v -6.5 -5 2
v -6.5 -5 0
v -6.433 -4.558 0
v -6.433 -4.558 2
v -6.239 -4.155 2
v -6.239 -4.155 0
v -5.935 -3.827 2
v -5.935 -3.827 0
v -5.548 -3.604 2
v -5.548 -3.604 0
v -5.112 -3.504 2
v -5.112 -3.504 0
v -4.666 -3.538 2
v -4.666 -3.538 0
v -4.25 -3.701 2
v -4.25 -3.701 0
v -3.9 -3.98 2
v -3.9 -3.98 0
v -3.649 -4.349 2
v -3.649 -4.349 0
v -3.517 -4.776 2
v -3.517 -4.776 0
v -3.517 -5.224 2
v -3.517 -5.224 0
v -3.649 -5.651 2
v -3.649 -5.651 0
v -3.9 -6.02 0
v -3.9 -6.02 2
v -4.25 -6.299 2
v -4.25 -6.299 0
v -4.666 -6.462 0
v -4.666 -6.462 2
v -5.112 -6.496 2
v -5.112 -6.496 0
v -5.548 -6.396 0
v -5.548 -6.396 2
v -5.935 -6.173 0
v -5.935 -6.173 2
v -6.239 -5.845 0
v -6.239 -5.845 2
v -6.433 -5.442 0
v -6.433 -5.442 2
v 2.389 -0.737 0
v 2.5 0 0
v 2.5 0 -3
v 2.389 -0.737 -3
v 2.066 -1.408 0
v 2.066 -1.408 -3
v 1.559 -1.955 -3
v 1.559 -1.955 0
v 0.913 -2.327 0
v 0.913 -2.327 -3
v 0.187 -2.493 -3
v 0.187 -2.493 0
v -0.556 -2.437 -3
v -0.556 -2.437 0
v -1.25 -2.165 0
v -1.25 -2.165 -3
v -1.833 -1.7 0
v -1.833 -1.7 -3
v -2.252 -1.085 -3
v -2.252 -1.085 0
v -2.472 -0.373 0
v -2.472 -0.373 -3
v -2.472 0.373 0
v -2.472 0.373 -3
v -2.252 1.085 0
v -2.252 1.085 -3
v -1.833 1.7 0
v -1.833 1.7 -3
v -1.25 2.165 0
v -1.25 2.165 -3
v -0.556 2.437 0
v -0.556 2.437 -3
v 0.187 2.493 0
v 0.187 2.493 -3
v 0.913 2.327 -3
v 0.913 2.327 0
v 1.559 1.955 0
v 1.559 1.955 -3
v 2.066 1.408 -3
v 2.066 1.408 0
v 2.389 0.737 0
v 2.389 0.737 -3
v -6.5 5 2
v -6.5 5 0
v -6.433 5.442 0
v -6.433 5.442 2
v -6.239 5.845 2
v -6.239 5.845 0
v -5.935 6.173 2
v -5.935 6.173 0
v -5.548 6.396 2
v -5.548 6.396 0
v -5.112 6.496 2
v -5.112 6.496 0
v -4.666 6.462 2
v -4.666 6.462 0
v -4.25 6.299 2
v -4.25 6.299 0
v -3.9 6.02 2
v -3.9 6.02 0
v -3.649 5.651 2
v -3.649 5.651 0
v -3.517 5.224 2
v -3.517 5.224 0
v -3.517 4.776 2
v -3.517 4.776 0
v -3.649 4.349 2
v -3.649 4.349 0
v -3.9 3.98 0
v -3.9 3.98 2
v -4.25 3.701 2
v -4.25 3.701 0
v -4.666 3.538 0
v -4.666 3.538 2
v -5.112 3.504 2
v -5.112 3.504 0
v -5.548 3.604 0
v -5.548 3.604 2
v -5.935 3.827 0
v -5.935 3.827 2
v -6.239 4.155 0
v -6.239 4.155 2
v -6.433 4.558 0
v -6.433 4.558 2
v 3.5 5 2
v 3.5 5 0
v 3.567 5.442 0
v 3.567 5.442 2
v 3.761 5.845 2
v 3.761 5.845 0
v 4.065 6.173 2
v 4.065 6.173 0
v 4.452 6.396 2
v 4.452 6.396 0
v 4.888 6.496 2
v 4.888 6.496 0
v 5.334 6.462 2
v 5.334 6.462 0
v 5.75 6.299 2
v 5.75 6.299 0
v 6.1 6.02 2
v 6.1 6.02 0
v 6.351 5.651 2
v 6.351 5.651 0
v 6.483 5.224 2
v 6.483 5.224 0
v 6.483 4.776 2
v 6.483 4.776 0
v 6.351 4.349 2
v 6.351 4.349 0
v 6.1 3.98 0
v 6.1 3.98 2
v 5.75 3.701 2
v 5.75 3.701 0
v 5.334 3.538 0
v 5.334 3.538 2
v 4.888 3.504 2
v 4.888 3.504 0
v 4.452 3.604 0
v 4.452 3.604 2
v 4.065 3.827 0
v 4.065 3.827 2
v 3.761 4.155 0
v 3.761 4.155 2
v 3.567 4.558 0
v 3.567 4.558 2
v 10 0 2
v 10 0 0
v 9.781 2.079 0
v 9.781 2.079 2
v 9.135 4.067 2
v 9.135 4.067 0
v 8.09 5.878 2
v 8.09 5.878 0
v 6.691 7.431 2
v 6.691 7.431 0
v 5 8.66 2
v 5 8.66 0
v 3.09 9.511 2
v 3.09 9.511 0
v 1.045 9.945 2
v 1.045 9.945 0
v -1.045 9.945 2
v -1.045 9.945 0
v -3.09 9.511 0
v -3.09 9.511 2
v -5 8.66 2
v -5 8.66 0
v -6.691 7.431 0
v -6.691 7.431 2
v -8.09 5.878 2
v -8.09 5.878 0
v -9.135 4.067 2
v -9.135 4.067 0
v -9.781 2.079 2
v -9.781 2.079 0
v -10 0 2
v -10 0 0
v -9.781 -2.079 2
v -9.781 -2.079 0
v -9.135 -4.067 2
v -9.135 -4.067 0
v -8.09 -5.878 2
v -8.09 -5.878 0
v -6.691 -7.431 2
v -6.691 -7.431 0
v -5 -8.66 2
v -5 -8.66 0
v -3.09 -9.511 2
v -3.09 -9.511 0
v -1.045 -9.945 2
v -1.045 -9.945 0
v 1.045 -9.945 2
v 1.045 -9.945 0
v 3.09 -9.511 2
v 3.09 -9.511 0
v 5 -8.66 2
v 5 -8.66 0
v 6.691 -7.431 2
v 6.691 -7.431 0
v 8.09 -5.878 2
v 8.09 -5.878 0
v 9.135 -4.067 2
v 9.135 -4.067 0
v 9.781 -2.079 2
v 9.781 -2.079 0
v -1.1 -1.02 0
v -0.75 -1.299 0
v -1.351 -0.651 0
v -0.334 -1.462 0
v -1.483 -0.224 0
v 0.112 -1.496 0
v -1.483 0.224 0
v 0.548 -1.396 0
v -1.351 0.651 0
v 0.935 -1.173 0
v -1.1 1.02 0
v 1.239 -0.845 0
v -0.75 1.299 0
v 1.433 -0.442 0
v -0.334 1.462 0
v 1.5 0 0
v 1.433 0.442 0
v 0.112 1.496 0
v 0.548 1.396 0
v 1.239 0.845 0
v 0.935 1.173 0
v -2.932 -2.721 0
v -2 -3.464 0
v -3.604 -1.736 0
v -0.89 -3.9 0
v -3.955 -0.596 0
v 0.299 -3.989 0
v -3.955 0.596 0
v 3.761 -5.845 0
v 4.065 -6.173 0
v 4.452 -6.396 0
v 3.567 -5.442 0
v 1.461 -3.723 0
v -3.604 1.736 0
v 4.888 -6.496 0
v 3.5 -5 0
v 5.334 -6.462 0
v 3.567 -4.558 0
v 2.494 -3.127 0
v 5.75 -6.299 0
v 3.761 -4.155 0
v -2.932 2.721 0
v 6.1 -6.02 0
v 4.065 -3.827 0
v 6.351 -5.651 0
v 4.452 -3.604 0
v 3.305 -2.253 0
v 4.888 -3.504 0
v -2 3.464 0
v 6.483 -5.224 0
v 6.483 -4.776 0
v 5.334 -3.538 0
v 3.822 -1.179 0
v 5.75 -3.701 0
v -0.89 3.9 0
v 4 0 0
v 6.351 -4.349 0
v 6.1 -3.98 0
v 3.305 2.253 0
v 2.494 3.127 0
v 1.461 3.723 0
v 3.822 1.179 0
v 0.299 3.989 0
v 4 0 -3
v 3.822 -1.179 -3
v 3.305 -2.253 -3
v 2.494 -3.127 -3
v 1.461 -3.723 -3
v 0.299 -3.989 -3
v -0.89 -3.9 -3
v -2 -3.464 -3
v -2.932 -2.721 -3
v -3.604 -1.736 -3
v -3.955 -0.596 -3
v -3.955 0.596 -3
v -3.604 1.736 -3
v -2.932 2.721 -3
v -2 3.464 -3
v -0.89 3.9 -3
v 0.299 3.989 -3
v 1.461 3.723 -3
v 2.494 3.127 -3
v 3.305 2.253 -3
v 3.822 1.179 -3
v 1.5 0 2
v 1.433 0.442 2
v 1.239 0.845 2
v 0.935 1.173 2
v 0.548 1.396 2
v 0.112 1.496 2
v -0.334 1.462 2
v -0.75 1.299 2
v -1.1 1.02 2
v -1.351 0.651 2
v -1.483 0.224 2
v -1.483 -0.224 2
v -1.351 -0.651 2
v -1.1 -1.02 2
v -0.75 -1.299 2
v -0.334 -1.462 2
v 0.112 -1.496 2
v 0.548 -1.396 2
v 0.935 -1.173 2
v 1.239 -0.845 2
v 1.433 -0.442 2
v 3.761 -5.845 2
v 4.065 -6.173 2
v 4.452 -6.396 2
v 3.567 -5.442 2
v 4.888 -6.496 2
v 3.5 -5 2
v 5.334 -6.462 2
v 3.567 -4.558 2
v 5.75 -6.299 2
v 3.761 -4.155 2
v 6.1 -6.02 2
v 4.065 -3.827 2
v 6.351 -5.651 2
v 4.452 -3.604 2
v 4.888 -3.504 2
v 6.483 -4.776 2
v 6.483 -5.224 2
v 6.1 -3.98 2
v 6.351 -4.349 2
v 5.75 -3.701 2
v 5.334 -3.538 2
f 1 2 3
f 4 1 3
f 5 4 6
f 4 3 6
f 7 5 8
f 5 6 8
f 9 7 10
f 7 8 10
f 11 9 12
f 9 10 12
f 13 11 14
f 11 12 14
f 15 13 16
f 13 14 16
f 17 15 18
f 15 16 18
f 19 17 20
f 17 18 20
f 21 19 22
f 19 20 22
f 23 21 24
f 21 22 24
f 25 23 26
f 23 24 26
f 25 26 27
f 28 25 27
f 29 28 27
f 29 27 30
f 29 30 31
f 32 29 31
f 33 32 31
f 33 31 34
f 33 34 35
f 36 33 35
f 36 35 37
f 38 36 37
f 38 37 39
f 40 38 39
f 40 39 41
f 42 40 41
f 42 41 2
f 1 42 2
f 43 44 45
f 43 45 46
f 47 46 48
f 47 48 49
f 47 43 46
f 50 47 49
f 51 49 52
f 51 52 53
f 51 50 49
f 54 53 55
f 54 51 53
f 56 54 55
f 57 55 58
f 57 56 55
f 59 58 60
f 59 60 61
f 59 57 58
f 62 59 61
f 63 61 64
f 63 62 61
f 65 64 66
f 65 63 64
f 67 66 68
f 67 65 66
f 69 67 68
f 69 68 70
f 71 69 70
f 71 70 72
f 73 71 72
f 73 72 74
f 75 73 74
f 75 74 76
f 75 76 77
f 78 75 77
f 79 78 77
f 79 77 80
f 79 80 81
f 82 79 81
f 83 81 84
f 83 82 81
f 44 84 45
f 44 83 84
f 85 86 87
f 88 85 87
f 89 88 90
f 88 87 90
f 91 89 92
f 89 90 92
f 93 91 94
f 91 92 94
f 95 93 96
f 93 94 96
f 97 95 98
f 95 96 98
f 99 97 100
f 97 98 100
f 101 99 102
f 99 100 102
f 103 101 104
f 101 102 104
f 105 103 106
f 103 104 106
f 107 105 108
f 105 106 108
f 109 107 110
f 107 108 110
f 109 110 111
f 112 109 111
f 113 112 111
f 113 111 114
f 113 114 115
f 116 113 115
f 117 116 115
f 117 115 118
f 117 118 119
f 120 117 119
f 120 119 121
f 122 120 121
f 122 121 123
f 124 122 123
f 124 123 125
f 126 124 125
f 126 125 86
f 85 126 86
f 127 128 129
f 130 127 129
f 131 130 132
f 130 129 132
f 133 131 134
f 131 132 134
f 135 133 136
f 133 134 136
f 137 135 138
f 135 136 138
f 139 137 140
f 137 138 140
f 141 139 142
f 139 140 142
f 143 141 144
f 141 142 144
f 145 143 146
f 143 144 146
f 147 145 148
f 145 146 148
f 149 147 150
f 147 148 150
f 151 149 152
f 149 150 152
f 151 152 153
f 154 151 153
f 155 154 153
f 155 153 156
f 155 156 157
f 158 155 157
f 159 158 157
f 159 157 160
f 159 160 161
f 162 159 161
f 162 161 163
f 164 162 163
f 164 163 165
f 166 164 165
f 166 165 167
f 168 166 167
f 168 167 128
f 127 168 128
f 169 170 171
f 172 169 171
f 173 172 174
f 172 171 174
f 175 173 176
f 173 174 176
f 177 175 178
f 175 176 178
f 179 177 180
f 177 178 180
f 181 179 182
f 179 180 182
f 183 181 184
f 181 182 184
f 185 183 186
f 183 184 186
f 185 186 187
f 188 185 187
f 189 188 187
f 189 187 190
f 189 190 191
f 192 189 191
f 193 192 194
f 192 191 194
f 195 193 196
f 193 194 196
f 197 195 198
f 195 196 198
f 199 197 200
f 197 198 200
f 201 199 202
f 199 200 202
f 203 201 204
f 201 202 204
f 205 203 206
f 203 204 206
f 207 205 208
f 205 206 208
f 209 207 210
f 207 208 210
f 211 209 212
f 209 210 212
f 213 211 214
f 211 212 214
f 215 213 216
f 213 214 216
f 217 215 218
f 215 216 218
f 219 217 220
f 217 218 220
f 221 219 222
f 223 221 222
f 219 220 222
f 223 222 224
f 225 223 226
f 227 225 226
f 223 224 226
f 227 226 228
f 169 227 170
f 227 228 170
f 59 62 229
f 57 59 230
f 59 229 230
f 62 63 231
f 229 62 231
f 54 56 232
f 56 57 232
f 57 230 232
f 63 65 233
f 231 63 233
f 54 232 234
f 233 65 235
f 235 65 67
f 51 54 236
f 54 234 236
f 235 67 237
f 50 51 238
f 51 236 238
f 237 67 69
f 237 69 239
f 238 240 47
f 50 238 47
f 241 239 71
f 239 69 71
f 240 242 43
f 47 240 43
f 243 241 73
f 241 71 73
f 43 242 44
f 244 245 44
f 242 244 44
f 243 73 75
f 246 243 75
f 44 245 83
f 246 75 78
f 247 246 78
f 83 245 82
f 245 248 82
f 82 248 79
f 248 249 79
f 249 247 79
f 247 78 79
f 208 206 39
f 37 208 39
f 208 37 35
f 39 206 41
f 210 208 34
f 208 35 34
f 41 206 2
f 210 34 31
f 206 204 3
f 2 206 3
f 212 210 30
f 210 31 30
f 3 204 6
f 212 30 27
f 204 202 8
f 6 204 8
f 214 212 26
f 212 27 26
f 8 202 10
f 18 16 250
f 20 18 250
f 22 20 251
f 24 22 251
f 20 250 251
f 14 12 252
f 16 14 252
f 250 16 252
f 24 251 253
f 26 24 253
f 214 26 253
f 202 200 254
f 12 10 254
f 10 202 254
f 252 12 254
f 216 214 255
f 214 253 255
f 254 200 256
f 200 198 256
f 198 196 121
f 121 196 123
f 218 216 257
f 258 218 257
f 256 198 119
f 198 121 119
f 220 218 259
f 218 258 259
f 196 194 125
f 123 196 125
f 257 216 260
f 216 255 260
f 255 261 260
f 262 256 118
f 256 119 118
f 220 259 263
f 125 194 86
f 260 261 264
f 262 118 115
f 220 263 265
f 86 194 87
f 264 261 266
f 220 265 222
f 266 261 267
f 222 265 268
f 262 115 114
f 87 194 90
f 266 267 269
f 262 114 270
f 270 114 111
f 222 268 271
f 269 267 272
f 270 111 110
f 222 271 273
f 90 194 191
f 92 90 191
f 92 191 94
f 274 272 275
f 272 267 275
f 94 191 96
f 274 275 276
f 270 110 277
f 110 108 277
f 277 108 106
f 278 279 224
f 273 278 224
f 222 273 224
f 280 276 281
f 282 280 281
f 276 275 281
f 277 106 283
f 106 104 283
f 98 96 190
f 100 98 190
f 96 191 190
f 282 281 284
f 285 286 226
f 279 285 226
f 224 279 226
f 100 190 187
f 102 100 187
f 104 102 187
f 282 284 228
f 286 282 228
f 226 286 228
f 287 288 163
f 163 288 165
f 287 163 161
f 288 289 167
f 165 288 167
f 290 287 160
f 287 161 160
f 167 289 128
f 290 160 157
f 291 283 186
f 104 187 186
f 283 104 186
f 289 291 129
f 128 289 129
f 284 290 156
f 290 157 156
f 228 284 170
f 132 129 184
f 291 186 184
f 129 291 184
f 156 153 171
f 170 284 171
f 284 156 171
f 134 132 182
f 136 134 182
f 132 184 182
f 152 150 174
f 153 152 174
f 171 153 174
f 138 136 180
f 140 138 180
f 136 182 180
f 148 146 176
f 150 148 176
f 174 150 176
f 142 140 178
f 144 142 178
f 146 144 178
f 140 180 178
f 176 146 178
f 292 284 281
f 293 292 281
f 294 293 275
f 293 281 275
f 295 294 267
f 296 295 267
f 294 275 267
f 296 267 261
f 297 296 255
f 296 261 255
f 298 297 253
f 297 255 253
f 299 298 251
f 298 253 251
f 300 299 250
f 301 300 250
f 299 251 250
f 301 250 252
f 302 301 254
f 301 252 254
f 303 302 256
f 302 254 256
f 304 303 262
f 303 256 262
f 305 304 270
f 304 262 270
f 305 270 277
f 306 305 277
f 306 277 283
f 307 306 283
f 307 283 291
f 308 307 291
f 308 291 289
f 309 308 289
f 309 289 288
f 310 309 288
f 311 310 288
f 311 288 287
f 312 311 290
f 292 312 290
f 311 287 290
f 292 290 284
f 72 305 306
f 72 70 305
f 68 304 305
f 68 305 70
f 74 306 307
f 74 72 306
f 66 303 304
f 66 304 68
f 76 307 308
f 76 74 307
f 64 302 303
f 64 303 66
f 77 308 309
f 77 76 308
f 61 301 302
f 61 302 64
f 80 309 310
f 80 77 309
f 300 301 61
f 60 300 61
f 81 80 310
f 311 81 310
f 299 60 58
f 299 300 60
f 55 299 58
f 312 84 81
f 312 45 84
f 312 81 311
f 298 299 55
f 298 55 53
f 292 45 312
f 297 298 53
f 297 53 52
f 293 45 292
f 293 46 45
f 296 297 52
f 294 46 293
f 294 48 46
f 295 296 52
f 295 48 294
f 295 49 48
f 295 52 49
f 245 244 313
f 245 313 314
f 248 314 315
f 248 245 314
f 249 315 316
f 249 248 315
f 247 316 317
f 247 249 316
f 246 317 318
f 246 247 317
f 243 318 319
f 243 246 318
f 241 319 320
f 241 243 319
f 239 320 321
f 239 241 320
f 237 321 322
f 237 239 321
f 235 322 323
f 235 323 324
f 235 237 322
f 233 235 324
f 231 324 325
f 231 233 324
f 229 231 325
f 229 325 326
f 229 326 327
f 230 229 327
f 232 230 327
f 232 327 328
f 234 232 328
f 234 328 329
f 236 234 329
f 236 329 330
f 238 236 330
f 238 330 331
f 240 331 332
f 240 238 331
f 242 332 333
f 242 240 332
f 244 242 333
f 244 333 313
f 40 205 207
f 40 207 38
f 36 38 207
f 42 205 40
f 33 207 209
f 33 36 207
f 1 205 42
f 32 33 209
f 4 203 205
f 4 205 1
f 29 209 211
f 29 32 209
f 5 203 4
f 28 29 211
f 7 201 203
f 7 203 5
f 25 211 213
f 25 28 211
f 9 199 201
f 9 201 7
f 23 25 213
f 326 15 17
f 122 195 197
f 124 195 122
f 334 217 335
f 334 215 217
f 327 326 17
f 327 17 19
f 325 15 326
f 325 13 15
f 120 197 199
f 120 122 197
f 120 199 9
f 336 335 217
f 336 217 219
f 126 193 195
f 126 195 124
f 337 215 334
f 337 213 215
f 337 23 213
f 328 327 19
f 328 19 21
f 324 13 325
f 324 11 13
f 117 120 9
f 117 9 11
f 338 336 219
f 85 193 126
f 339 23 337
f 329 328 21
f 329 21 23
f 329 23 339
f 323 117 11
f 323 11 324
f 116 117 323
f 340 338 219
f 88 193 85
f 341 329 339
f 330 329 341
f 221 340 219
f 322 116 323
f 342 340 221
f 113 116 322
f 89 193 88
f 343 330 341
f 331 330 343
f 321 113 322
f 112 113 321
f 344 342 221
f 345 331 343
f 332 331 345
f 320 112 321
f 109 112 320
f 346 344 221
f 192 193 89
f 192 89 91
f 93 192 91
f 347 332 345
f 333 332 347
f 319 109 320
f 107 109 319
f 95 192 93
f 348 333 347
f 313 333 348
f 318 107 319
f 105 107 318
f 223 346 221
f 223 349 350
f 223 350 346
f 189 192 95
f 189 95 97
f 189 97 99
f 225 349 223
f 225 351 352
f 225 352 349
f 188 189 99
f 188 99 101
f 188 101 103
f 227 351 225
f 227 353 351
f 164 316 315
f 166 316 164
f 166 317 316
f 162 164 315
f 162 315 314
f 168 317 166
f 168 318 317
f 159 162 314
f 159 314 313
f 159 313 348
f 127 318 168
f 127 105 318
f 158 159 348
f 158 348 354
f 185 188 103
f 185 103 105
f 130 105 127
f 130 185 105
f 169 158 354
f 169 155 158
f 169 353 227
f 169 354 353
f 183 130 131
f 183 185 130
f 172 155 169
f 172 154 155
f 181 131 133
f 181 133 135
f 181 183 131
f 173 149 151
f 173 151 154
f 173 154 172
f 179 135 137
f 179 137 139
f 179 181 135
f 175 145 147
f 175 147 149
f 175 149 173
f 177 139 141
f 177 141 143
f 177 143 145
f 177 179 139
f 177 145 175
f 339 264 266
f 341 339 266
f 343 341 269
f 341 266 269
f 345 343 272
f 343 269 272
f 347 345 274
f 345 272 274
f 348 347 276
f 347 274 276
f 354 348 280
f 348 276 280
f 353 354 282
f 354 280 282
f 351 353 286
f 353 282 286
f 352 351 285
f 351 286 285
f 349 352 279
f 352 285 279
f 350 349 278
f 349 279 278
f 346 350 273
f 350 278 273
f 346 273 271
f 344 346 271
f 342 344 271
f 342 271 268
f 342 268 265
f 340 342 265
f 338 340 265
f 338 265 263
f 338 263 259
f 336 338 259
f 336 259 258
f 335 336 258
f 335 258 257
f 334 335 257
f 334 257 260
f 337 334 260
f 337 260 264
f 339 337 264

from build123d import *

# Parameters (mm, degrees)
F0_R     = 10
F0_R_2   = 1.5
F1_DEPTH = 2
F3_D     = 3
F4_R     = 4
F4_R_2   = 2.5
F5_DEPTH = 3


# Not quite as in the source:
# - a feature names something its author has since deleted; it is built from what else it names


with BuildPart() as f1:
    # F0 (on Top) → F1 (new body)
    with BuildSketch(Plane.XY):
        Circle(F0_R)
        Circle(F0_R_2, mode=Mode.SUBTRACT)
    extrude(amount=F1_DEPTH)

    # F3 (through all)
    with Locations(Plane.XY.offset(2)):
        with Locations((-5, 5), (5, 5), (5, -5), (-5, -5)):
            Hole(F3_D / 2)

    # F4 (on face) → F5 (join)
    with BuildSketch(Plane(origin=(0, 0, 0), x_dir=(1, 0, 0), z_dir=(0, 0, -1))):
        Circle(F4_R)
        Circle(F4_R_2, mode=Mode.SUBTRACT)
    extrude(amount=F5_DEPTH)


solid = f1.part
